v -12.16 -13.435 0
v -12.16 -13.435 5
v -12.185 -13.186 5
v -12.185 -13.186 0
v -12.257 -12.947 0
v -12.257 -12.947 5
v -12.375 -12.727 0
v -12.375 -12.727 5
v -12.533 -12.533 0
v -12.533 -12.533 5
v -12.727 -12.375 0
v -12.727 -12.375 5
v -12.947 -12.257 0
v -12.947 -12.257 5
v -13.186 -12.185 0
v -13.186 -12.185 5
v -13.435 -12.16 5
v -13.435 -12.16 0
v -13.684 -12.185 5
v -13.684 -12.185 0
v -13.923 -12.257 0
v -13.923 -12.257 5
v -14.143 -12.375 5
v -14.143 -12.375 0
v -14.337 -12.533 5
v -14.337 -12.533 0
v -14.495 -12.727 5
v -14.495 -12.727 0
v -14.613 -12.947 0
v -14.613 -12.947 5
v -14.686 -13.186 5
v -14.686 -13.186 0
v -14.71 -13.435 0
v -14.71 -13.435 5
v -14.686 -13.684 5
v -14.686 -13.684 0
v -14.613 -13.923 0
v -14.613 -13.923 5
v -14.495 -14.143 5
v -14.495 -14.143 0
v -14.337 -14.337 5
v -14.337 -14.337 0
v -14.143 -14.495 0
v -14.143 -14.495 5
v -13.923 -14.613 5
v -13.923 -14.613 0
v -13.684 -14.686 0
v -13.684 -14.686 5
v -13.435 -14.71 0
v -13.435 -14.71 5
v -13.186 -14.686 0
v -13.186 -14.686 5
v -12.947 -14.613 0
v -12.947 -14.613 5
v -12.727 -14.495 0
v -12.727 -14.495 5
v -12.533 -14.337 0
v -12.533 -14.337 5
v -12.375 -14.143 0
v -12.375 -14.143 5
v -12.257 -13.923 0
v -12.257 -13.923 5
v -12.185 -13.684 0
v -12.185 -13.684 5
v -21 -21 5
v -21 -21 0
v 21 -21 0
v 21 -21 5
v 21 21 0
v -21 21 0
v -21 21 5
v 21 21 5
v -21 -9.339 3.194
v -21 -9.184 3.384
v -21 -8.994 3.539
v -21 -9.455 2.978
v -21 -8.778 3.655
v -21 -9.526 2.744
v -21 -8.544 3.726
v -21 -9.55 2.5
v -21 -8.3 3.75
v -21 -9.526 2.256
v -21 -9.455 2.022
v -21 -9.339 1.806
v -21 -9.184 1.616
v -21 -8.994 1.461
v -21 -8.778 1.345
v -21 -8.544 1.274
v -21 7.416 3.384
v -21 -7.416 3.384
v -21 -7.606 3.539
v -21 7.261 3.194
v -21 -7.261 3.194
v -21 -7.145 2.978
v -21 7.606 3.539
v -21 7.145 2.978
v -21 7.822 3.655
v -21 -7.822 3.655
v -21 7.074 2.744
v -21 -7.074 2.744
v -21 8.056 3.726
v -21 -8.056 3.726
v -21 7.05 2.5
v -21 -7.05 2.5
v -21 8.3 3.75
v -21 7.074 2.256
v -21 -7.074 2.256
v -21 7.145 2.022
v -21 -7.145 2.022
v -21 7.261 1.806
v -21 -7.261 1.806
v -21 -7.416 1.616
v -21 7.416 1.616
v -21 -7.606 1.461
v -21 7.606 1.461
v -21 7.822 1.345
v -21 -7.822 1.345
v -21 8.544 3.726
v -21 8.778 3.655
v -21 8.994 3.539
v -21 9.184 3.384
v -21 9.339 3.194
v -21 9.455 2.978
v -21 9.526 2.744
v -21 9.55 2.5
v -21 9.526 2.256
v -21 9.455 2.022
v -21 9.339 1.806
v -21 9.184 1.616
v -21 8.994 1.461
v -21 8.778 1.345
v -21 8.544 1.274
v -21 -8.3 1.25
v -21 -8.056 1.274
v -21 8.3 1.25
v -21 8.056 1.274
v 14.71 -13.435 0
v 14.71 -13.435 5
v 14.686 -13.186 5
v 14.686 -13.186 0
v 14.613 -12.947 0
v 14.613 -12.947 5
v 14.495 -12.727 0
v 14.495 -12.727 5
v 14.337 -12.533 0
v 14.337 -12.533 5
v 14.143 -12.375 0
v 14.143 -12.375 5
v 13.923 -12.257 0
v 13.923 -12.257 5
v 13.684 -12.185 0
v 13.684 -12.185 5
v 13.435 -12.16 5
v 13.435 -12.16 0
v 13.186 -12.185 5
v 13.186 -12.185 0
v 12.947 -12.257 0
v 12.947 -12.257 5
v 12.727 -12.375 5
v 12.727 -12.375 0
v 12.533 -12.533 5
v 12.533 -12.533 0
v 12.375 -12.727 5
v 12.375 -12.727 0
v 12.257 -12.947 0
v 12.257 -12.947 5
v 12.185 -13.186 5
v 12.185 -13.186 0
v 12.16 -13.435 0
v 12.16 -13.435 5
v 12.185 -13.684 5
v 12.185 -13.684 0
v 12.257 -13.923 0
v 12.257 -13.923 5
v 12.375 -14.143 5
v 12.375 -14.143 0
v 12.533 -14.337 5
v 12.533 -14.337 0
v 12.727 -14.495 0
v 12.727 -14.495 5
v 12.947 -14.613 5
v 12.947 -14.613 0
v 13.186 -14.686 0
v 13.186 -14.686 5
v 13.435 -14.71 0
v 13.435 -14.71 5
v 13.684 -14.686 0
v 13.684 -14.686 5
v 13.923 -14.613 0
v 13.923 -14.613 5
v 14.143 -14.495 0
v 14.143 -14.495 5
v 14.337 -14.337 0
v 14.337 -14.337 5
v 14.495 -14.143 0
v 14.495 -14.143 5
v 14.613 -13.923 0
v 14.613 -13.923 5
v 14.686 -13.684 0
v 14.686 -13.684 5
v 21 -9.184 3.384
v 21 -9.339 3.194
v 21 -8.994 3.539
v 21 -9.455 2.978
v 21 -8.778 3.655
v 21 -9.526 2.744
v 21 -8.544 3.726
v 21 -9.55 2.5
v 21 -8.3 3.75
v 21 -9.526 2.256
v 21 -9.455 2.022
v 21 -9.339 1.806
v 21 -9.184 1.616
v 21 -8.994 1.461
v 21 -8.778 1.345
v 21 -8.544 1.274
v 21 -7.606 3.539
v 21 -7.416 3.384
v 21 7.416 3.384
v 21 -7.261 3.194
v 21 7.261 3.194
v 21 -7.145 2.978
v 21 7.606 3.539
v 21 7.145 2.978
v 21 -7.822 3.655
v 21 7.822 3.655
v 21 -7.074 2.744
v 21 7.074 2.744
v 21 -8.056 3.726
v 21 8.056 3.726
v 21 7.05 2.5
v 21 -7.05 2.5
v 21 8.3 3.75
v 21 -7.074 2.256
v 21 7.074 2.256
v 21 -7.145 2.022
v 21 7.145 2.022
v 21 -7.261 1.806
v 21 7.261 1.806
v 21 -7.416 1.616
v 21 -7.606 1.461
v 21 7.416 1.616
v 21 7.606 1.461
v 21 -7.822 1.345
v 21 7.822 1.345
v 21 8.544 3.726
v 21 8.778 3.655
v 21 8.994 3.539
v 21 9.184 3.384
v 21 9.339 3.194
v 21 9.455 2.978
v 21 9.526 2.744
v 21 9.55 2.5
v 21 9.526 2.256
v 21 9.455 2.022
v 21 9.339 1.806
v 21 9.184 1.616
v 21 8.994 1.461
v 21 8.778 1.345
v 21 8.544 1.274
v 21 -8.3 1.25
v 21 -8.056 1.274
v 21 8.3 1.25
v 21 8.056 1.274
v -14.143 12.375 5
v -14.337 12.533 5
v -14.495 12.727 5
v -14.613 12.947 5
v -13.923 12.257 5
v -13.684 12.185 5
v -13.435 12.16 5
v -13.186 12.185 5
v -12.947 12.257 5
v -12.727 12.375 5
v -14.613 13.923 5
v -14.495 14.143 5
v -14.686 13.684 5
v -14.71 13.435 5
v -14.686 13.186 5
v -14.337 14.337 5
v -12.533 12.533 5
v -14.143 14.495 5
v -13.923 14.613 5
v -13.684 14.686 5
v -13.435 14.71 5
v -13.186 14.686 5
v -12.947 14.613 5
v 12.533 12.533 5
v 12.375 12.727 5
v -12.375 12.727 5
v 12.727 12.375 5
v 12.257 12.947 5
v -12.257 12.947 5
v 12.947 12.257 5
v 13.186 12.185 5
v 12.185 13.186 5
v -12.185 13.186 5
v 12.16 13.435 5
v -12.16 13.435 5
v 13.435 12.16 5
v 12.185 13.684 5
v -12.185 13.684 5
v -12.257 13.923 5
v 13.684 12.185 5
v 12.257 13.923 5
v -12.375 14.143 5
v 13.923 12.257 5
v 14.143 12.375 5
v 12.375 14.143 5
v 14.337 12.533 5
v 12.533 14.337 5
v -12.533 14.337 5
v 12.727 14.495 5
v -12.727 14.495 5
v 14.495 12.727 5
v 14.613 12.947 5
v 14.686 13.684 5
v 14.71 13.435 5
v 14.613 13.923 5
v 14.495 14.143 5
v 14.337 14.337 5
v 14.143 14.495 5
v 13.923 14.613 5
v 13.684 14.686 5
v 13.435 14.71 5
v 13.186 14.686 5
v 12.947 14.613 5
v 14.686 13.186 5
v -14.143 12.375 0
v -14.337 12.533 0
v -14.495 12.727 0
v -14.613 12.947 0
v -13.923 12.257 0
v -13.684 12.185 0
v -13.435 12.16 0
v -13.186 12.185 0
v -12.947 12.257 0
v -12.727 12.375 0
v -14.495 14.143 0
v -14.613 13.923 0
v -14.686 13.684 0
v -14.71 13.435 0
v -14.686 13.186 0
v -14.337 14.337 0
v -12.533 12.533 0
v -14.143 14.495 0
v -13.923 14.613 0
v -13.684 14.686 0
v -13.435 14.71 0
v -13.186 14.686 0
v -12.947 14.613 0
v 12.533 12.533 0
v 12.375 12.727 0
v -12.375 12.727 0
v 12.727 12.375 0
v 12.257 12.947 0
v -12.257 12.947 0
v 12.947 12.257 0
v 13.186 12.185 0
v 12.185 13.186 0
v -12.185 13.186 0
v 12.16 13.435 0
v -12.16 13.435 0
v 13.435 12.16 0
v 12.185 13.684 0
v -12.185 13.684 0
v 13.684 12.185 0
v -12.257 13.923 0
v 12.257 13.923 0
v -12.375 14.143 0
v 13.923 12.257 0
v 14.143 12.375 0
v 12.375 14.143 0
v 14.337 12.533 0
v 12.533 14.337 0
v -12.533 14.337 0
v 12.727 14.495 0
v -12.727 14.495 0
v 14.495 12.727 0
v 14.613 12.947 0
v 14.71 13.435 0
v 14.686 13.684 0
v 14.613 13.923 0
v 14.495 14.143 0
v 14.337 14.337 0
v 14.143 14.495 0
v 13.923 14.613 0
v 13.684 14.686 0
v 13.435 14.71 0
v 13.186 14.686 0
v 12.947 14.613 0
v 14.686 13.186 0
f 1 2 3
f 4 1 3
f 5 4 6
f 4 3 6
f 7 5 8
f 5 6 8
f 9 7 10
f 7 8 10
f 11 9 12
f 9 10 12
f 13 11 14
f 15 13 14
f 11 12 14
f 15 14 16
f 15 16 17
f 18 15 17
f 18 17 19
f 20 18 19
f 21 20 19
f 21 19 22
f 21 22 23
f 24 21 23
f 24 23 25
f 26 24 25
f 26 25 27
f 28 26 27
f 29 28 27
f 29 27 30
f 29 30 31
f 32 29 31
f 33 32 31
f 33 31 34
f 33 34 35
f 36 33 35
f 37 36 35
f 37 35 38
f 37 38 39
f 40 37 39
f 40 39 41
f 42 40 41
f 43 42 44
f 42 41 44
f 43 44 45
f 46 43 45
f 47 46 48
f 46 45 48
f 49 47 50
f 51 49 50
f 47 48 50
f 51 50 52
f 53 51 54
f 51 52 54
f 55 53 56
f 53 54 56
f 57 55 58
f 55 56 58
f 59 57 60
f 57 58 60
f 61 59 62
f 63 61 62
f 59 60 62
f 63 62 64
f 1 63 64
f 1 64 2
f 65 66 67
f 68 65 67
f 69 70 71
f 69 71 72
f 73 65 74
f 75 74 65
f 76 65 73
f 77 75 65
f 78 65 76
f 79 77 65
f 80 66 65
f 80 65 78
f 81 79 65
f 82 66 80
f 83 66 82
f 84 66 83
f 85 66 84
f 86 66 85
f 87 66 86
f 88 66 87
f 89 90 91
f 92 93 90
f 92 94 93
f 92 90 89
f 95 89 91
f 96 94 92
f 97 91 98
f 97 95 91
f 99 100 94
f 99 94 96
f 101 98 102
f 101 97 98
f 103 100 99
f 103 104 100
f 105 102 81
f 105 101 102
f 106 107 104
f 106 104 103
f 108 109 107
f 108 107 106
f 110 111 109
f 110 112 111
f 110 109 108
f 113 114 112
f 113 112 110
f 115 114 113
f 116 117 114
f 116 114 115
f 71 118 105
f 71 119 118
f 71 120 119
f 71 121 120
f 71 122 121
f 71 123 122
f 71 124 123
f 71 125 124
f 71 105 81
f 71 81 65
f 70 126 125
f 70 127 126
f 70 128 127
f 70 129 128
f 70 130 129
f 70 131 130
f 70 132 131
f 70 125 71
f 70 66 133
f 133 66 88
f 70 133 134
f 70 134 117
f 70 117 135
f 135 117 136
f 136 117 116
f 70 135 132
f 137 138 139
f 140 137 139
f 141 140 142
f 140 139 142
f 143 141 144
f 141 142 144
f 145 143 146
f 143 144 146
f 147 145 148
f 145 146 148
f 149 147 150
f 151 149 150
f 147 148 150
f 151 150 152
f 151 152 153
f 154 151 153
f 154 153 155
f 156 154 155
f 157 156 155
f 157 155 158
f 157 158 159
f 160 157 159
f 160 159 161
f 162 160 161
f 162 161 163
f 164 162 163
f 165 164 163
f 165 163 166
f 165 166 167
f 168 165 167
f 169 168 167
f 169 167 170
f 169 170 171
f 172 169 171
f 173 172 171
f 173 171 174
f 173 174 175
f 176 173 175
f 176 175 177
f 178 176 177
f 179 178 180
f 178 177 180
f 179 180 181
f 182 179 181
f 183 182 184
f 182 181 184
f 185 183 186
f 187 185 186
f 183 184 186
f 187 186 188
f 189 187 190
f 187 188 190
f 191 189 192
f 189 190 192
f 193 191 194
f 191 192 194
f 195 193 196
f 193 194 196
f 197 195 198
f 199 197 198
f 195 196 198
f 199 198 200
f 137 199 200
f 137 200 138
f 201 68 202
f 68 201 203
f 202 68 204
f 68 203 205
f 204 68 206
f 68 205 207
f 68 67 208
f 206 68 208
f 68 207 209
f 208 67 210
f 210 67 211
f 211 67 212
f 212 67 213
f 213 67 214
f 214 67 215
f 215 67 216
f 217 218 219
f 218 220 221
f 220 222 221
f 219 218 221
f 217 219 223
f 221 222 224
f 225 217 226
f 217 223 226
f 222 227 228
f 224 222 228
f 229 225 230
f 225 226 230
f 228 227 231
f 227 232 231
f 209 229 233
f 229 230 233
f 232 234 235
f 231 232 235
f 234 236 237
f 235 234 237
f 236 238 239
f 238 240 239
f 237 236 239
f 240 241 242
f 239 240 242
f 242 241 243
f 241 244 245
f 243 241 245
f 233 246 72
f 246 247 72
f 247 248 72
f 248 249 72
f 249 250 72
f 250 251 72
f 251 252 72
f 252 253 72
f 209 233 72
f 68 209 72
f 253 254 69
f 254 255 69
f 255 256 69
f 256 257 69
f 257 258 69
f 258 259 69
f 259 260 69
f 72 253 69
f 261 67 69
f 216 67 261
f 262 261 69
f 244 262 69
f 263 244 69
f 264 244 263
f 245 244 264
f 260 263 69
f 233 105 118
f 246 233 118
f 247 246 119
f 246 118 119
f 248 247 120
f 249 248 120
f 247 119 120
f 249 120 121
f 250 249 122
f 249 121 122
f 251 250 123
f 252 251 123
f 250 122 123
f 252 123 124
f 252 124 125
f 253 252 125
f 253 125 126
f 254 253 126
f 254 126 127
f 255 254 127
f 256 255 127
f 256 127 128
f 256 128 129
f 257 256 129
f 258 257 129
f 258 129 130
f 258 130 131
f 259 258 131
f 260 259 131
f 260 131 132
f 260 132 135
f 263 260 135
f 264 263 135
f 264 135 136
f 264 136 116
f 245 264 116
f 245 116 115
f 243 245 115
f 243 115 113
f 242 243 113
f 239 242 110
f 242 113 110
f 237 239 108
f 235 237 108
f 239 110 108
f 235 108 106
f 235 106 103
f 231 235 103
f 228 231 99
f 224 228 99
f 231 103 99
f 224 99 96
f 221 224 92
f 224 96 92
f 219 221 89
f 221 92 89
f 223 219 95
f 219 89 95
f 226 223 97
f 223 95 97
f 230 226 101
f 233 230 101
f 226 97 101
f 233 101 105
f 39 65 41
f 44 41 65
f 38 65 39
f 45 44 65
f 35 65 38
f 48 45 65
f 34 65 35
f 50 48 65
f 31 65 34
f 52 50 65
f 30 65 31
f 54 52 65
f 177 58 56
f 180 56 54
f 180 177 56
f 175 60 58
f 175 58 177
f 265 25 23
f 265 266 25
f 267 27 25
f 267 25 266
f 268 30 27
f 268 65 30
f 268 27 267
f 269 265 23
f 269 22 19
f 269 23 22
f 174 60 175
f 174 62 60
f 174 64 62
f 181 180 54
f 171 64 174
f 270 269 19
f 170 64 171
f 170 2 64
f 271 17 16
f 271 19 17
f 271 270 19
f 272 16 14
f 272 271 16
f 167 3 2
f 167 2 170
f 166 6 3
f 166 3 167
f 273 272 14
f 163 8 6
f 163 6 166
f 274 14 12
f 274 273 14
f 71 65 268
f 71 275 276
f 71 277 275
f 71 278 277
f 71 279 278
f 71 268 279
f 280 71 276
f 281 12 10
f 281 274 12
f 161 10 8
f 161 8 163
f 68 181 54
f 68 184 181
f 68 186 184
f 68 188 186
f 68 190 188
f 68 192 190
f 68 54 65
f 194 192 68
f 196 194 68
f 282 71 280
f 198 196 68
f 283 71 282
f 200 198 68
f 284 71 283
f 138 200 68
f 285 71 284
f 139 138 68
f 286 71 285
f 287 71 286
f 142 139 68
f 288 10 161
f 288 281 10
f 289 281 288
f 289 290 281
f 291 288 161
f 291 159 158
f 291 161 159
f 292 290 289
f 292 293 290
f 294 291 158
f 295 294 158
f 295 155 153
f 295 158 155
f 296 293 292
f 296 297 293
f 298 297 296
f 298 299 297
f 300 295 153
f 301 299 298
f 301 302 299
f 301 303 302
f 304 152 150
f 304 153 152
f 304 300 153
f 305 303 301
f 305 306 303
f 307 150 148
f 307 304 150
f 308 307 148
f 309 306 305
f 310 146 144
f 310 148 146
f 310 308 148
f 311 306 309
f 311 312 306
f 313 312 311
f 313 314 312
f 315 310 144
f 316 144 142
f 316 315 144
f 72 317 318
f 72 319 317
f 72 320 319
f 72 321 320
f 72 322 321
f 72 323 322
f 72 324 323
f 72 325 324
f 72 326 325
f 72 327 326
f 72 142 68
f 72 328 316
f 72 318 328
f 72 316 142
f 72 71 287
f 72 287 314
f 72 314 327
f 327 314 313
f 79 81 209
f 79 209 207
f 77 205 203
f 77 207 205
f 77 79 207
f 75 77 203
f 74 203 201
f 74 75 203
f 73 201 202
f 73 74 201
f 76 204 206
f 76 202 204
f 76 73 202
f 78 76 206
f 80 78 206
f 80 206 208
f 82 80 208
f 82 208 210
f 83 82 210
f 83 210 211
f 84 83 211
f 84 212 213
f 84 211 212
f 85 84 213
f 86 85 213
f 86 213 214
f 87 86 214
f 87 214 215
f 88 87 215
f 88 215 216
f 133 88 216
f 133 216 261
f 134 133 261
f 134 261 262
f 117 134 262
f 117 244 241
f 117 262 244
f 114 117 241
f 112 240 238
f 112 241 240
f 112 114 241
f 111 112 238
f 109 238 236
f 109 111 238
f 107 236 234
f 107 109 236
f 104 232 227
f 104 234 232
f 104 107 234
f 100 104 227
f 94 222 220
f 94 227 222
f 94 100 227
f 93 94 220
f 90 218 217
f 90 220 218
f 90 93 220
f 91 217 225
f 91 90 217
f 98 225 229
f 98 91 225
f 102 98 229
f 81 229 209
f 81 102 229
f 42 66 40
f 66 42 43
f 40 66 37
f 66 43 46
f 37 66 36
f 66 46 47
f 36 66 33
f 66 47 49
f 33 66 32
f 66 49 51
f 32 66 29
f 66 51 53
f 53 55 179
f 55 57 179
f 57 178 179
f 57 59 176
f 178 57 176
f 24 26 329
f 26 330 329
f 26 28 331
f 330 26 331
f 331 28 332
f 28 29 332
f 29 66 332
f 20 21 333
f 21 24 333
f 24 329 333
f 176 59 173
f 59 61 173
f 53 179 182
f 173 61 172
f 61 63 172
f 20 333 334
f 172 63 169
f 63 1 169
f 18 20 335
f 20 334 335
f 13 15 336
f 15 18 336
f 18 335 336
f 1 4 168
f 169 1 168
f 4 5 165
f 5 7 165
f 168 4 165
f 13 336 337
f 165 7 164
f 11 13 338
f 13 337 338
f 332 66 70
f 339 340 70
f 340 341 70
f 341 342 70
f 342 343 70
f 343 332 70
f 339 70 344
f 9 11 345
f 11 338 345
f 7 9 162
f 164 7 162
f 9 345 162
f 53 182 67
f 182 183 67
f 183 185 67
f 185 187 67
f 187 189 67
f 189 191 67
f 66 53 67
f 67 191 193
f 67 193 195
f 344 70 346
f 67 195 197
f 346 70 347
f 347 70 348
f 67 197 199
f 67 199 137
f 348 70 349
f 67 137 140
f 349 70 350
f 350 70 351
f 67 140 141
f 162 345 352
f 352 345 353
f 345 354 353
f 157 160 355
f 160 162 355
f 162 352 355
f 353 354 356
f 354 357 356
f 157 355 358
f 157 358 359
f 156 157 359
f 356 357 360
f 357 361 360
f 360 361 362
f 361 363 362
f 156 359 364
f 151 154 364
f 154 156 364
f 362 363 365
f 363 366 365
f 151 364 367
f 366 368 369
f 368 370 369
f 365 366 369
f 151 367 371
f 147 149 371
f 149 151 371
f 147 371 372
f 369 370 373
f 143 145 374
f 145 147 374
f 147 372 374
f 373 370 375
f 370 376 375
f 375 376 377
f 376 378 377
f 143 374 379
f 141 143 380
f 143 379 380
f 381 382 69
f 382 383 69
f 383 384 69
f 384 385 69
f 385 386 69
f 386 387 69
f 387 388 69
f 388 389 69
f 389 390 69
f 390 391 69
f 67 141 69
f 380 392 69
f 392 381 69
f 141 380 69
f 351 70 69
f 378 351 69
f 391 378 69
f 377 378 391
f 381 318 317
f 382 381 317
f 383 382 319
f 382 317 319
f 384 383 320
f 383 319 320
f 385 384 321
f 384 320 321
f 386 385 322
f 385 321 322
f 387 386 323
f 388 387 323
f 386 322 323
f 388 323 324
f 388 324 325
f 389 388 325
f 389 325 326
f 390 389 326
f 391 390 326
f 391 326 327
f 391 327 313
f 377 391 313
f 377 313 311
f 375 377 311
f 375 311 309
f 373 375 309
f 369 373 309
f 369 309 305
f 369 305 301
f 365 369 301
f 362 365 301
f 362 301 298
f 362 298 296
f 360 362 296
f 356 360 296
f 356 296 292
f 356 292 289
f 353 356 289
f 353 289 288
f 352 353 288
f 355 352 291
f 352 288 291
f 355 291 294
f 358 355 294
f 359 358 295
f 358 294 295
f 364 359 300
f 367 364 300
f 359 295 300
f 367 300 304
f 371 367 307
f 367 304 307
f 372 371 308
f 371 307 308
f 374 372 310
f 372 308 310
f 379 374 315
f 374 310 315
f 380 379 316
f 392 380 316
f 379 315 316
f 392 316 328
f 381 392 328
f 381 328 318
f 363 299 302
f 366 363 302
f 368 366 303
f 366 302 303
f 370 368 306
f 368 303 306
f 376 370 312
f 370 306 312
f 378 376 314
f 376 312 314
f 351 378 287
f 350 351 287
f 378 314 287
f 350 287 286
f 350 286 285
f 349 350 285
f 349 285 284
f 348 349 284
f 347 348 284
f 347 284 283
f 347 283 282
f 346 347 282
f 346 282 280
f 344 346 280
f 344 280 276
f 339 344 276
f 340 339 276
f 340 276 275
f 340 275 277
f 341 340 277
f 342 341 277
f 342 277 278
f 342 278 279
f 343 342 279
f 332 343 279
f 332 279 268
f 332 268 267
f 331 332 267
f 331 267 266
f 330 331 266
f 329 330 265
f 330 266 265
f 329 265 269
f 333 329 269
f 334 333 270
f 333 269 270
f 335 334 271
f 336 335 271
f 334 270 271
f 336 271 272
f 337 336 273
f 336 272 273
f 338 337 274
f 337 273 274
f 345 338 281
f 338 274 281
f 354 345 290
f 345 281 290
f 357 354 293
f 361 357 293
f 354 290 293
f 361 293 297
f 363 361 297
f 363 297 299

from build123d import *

# Parameters (mm, degrees)
SKETCH_1_W          = 42
SKETCH_1_H          = 42
EXTRUDE_1_DEPTH     = 5
SKETCH_2_R          = 1.275
CUT_EXTRUDE_1_DEPTH = 6
HOLE_WIZARD_M3_1_D  = 2.5


with BuildPart() as part:
    # 草图1 → 凸台-拉伸1 (new body)
    with BuildSketch(Plane.XY):
        Rectangle(SKETCH_1_W, SKETCH_1_H)
    extrude(amount=EXTRUDE_1_DEPTH)

    # 草图2 → 切除-拉伸1 (cut, through all)
    with BuildSketch(Plane.XY.offset(5)):
        with Locations((13.435028843, 13.435028843)):
            Circle(SKETCH_2_R)
        with Locations((13.435028843, -13.435028843)):
            Circle(SKETCH_2_R)
        with Locations((-13.435028843, -13.435028843)):
            Circle(SKETCH_2_R)
        with Locations((-13.435028843, 13.435028843)):
            Circle(SKETCH_2_R)
    extrude(amount=-CUT_EXTRUDE_1_DEPTH, mode=Mode.SUBTRACT)

    # M3 螺纹孔1 (through all)
    with Locations(Plane(origin=(21, 0, 0), x_dir=(0, 0, -1), z_dir=(1, 0, 0))):
        with Locations((-2.5, 8.3)):
            hole_wizard_m3_1 = Hole(HOLE_WIZARD_M3_1_D / 2)

    # 镜向1: M3 螺纹孔1 across plane
    add(hole_wizard_m3_1.mirror(Plane.ZX), mode=Mode.SUBTRACT)


solid = part.part
